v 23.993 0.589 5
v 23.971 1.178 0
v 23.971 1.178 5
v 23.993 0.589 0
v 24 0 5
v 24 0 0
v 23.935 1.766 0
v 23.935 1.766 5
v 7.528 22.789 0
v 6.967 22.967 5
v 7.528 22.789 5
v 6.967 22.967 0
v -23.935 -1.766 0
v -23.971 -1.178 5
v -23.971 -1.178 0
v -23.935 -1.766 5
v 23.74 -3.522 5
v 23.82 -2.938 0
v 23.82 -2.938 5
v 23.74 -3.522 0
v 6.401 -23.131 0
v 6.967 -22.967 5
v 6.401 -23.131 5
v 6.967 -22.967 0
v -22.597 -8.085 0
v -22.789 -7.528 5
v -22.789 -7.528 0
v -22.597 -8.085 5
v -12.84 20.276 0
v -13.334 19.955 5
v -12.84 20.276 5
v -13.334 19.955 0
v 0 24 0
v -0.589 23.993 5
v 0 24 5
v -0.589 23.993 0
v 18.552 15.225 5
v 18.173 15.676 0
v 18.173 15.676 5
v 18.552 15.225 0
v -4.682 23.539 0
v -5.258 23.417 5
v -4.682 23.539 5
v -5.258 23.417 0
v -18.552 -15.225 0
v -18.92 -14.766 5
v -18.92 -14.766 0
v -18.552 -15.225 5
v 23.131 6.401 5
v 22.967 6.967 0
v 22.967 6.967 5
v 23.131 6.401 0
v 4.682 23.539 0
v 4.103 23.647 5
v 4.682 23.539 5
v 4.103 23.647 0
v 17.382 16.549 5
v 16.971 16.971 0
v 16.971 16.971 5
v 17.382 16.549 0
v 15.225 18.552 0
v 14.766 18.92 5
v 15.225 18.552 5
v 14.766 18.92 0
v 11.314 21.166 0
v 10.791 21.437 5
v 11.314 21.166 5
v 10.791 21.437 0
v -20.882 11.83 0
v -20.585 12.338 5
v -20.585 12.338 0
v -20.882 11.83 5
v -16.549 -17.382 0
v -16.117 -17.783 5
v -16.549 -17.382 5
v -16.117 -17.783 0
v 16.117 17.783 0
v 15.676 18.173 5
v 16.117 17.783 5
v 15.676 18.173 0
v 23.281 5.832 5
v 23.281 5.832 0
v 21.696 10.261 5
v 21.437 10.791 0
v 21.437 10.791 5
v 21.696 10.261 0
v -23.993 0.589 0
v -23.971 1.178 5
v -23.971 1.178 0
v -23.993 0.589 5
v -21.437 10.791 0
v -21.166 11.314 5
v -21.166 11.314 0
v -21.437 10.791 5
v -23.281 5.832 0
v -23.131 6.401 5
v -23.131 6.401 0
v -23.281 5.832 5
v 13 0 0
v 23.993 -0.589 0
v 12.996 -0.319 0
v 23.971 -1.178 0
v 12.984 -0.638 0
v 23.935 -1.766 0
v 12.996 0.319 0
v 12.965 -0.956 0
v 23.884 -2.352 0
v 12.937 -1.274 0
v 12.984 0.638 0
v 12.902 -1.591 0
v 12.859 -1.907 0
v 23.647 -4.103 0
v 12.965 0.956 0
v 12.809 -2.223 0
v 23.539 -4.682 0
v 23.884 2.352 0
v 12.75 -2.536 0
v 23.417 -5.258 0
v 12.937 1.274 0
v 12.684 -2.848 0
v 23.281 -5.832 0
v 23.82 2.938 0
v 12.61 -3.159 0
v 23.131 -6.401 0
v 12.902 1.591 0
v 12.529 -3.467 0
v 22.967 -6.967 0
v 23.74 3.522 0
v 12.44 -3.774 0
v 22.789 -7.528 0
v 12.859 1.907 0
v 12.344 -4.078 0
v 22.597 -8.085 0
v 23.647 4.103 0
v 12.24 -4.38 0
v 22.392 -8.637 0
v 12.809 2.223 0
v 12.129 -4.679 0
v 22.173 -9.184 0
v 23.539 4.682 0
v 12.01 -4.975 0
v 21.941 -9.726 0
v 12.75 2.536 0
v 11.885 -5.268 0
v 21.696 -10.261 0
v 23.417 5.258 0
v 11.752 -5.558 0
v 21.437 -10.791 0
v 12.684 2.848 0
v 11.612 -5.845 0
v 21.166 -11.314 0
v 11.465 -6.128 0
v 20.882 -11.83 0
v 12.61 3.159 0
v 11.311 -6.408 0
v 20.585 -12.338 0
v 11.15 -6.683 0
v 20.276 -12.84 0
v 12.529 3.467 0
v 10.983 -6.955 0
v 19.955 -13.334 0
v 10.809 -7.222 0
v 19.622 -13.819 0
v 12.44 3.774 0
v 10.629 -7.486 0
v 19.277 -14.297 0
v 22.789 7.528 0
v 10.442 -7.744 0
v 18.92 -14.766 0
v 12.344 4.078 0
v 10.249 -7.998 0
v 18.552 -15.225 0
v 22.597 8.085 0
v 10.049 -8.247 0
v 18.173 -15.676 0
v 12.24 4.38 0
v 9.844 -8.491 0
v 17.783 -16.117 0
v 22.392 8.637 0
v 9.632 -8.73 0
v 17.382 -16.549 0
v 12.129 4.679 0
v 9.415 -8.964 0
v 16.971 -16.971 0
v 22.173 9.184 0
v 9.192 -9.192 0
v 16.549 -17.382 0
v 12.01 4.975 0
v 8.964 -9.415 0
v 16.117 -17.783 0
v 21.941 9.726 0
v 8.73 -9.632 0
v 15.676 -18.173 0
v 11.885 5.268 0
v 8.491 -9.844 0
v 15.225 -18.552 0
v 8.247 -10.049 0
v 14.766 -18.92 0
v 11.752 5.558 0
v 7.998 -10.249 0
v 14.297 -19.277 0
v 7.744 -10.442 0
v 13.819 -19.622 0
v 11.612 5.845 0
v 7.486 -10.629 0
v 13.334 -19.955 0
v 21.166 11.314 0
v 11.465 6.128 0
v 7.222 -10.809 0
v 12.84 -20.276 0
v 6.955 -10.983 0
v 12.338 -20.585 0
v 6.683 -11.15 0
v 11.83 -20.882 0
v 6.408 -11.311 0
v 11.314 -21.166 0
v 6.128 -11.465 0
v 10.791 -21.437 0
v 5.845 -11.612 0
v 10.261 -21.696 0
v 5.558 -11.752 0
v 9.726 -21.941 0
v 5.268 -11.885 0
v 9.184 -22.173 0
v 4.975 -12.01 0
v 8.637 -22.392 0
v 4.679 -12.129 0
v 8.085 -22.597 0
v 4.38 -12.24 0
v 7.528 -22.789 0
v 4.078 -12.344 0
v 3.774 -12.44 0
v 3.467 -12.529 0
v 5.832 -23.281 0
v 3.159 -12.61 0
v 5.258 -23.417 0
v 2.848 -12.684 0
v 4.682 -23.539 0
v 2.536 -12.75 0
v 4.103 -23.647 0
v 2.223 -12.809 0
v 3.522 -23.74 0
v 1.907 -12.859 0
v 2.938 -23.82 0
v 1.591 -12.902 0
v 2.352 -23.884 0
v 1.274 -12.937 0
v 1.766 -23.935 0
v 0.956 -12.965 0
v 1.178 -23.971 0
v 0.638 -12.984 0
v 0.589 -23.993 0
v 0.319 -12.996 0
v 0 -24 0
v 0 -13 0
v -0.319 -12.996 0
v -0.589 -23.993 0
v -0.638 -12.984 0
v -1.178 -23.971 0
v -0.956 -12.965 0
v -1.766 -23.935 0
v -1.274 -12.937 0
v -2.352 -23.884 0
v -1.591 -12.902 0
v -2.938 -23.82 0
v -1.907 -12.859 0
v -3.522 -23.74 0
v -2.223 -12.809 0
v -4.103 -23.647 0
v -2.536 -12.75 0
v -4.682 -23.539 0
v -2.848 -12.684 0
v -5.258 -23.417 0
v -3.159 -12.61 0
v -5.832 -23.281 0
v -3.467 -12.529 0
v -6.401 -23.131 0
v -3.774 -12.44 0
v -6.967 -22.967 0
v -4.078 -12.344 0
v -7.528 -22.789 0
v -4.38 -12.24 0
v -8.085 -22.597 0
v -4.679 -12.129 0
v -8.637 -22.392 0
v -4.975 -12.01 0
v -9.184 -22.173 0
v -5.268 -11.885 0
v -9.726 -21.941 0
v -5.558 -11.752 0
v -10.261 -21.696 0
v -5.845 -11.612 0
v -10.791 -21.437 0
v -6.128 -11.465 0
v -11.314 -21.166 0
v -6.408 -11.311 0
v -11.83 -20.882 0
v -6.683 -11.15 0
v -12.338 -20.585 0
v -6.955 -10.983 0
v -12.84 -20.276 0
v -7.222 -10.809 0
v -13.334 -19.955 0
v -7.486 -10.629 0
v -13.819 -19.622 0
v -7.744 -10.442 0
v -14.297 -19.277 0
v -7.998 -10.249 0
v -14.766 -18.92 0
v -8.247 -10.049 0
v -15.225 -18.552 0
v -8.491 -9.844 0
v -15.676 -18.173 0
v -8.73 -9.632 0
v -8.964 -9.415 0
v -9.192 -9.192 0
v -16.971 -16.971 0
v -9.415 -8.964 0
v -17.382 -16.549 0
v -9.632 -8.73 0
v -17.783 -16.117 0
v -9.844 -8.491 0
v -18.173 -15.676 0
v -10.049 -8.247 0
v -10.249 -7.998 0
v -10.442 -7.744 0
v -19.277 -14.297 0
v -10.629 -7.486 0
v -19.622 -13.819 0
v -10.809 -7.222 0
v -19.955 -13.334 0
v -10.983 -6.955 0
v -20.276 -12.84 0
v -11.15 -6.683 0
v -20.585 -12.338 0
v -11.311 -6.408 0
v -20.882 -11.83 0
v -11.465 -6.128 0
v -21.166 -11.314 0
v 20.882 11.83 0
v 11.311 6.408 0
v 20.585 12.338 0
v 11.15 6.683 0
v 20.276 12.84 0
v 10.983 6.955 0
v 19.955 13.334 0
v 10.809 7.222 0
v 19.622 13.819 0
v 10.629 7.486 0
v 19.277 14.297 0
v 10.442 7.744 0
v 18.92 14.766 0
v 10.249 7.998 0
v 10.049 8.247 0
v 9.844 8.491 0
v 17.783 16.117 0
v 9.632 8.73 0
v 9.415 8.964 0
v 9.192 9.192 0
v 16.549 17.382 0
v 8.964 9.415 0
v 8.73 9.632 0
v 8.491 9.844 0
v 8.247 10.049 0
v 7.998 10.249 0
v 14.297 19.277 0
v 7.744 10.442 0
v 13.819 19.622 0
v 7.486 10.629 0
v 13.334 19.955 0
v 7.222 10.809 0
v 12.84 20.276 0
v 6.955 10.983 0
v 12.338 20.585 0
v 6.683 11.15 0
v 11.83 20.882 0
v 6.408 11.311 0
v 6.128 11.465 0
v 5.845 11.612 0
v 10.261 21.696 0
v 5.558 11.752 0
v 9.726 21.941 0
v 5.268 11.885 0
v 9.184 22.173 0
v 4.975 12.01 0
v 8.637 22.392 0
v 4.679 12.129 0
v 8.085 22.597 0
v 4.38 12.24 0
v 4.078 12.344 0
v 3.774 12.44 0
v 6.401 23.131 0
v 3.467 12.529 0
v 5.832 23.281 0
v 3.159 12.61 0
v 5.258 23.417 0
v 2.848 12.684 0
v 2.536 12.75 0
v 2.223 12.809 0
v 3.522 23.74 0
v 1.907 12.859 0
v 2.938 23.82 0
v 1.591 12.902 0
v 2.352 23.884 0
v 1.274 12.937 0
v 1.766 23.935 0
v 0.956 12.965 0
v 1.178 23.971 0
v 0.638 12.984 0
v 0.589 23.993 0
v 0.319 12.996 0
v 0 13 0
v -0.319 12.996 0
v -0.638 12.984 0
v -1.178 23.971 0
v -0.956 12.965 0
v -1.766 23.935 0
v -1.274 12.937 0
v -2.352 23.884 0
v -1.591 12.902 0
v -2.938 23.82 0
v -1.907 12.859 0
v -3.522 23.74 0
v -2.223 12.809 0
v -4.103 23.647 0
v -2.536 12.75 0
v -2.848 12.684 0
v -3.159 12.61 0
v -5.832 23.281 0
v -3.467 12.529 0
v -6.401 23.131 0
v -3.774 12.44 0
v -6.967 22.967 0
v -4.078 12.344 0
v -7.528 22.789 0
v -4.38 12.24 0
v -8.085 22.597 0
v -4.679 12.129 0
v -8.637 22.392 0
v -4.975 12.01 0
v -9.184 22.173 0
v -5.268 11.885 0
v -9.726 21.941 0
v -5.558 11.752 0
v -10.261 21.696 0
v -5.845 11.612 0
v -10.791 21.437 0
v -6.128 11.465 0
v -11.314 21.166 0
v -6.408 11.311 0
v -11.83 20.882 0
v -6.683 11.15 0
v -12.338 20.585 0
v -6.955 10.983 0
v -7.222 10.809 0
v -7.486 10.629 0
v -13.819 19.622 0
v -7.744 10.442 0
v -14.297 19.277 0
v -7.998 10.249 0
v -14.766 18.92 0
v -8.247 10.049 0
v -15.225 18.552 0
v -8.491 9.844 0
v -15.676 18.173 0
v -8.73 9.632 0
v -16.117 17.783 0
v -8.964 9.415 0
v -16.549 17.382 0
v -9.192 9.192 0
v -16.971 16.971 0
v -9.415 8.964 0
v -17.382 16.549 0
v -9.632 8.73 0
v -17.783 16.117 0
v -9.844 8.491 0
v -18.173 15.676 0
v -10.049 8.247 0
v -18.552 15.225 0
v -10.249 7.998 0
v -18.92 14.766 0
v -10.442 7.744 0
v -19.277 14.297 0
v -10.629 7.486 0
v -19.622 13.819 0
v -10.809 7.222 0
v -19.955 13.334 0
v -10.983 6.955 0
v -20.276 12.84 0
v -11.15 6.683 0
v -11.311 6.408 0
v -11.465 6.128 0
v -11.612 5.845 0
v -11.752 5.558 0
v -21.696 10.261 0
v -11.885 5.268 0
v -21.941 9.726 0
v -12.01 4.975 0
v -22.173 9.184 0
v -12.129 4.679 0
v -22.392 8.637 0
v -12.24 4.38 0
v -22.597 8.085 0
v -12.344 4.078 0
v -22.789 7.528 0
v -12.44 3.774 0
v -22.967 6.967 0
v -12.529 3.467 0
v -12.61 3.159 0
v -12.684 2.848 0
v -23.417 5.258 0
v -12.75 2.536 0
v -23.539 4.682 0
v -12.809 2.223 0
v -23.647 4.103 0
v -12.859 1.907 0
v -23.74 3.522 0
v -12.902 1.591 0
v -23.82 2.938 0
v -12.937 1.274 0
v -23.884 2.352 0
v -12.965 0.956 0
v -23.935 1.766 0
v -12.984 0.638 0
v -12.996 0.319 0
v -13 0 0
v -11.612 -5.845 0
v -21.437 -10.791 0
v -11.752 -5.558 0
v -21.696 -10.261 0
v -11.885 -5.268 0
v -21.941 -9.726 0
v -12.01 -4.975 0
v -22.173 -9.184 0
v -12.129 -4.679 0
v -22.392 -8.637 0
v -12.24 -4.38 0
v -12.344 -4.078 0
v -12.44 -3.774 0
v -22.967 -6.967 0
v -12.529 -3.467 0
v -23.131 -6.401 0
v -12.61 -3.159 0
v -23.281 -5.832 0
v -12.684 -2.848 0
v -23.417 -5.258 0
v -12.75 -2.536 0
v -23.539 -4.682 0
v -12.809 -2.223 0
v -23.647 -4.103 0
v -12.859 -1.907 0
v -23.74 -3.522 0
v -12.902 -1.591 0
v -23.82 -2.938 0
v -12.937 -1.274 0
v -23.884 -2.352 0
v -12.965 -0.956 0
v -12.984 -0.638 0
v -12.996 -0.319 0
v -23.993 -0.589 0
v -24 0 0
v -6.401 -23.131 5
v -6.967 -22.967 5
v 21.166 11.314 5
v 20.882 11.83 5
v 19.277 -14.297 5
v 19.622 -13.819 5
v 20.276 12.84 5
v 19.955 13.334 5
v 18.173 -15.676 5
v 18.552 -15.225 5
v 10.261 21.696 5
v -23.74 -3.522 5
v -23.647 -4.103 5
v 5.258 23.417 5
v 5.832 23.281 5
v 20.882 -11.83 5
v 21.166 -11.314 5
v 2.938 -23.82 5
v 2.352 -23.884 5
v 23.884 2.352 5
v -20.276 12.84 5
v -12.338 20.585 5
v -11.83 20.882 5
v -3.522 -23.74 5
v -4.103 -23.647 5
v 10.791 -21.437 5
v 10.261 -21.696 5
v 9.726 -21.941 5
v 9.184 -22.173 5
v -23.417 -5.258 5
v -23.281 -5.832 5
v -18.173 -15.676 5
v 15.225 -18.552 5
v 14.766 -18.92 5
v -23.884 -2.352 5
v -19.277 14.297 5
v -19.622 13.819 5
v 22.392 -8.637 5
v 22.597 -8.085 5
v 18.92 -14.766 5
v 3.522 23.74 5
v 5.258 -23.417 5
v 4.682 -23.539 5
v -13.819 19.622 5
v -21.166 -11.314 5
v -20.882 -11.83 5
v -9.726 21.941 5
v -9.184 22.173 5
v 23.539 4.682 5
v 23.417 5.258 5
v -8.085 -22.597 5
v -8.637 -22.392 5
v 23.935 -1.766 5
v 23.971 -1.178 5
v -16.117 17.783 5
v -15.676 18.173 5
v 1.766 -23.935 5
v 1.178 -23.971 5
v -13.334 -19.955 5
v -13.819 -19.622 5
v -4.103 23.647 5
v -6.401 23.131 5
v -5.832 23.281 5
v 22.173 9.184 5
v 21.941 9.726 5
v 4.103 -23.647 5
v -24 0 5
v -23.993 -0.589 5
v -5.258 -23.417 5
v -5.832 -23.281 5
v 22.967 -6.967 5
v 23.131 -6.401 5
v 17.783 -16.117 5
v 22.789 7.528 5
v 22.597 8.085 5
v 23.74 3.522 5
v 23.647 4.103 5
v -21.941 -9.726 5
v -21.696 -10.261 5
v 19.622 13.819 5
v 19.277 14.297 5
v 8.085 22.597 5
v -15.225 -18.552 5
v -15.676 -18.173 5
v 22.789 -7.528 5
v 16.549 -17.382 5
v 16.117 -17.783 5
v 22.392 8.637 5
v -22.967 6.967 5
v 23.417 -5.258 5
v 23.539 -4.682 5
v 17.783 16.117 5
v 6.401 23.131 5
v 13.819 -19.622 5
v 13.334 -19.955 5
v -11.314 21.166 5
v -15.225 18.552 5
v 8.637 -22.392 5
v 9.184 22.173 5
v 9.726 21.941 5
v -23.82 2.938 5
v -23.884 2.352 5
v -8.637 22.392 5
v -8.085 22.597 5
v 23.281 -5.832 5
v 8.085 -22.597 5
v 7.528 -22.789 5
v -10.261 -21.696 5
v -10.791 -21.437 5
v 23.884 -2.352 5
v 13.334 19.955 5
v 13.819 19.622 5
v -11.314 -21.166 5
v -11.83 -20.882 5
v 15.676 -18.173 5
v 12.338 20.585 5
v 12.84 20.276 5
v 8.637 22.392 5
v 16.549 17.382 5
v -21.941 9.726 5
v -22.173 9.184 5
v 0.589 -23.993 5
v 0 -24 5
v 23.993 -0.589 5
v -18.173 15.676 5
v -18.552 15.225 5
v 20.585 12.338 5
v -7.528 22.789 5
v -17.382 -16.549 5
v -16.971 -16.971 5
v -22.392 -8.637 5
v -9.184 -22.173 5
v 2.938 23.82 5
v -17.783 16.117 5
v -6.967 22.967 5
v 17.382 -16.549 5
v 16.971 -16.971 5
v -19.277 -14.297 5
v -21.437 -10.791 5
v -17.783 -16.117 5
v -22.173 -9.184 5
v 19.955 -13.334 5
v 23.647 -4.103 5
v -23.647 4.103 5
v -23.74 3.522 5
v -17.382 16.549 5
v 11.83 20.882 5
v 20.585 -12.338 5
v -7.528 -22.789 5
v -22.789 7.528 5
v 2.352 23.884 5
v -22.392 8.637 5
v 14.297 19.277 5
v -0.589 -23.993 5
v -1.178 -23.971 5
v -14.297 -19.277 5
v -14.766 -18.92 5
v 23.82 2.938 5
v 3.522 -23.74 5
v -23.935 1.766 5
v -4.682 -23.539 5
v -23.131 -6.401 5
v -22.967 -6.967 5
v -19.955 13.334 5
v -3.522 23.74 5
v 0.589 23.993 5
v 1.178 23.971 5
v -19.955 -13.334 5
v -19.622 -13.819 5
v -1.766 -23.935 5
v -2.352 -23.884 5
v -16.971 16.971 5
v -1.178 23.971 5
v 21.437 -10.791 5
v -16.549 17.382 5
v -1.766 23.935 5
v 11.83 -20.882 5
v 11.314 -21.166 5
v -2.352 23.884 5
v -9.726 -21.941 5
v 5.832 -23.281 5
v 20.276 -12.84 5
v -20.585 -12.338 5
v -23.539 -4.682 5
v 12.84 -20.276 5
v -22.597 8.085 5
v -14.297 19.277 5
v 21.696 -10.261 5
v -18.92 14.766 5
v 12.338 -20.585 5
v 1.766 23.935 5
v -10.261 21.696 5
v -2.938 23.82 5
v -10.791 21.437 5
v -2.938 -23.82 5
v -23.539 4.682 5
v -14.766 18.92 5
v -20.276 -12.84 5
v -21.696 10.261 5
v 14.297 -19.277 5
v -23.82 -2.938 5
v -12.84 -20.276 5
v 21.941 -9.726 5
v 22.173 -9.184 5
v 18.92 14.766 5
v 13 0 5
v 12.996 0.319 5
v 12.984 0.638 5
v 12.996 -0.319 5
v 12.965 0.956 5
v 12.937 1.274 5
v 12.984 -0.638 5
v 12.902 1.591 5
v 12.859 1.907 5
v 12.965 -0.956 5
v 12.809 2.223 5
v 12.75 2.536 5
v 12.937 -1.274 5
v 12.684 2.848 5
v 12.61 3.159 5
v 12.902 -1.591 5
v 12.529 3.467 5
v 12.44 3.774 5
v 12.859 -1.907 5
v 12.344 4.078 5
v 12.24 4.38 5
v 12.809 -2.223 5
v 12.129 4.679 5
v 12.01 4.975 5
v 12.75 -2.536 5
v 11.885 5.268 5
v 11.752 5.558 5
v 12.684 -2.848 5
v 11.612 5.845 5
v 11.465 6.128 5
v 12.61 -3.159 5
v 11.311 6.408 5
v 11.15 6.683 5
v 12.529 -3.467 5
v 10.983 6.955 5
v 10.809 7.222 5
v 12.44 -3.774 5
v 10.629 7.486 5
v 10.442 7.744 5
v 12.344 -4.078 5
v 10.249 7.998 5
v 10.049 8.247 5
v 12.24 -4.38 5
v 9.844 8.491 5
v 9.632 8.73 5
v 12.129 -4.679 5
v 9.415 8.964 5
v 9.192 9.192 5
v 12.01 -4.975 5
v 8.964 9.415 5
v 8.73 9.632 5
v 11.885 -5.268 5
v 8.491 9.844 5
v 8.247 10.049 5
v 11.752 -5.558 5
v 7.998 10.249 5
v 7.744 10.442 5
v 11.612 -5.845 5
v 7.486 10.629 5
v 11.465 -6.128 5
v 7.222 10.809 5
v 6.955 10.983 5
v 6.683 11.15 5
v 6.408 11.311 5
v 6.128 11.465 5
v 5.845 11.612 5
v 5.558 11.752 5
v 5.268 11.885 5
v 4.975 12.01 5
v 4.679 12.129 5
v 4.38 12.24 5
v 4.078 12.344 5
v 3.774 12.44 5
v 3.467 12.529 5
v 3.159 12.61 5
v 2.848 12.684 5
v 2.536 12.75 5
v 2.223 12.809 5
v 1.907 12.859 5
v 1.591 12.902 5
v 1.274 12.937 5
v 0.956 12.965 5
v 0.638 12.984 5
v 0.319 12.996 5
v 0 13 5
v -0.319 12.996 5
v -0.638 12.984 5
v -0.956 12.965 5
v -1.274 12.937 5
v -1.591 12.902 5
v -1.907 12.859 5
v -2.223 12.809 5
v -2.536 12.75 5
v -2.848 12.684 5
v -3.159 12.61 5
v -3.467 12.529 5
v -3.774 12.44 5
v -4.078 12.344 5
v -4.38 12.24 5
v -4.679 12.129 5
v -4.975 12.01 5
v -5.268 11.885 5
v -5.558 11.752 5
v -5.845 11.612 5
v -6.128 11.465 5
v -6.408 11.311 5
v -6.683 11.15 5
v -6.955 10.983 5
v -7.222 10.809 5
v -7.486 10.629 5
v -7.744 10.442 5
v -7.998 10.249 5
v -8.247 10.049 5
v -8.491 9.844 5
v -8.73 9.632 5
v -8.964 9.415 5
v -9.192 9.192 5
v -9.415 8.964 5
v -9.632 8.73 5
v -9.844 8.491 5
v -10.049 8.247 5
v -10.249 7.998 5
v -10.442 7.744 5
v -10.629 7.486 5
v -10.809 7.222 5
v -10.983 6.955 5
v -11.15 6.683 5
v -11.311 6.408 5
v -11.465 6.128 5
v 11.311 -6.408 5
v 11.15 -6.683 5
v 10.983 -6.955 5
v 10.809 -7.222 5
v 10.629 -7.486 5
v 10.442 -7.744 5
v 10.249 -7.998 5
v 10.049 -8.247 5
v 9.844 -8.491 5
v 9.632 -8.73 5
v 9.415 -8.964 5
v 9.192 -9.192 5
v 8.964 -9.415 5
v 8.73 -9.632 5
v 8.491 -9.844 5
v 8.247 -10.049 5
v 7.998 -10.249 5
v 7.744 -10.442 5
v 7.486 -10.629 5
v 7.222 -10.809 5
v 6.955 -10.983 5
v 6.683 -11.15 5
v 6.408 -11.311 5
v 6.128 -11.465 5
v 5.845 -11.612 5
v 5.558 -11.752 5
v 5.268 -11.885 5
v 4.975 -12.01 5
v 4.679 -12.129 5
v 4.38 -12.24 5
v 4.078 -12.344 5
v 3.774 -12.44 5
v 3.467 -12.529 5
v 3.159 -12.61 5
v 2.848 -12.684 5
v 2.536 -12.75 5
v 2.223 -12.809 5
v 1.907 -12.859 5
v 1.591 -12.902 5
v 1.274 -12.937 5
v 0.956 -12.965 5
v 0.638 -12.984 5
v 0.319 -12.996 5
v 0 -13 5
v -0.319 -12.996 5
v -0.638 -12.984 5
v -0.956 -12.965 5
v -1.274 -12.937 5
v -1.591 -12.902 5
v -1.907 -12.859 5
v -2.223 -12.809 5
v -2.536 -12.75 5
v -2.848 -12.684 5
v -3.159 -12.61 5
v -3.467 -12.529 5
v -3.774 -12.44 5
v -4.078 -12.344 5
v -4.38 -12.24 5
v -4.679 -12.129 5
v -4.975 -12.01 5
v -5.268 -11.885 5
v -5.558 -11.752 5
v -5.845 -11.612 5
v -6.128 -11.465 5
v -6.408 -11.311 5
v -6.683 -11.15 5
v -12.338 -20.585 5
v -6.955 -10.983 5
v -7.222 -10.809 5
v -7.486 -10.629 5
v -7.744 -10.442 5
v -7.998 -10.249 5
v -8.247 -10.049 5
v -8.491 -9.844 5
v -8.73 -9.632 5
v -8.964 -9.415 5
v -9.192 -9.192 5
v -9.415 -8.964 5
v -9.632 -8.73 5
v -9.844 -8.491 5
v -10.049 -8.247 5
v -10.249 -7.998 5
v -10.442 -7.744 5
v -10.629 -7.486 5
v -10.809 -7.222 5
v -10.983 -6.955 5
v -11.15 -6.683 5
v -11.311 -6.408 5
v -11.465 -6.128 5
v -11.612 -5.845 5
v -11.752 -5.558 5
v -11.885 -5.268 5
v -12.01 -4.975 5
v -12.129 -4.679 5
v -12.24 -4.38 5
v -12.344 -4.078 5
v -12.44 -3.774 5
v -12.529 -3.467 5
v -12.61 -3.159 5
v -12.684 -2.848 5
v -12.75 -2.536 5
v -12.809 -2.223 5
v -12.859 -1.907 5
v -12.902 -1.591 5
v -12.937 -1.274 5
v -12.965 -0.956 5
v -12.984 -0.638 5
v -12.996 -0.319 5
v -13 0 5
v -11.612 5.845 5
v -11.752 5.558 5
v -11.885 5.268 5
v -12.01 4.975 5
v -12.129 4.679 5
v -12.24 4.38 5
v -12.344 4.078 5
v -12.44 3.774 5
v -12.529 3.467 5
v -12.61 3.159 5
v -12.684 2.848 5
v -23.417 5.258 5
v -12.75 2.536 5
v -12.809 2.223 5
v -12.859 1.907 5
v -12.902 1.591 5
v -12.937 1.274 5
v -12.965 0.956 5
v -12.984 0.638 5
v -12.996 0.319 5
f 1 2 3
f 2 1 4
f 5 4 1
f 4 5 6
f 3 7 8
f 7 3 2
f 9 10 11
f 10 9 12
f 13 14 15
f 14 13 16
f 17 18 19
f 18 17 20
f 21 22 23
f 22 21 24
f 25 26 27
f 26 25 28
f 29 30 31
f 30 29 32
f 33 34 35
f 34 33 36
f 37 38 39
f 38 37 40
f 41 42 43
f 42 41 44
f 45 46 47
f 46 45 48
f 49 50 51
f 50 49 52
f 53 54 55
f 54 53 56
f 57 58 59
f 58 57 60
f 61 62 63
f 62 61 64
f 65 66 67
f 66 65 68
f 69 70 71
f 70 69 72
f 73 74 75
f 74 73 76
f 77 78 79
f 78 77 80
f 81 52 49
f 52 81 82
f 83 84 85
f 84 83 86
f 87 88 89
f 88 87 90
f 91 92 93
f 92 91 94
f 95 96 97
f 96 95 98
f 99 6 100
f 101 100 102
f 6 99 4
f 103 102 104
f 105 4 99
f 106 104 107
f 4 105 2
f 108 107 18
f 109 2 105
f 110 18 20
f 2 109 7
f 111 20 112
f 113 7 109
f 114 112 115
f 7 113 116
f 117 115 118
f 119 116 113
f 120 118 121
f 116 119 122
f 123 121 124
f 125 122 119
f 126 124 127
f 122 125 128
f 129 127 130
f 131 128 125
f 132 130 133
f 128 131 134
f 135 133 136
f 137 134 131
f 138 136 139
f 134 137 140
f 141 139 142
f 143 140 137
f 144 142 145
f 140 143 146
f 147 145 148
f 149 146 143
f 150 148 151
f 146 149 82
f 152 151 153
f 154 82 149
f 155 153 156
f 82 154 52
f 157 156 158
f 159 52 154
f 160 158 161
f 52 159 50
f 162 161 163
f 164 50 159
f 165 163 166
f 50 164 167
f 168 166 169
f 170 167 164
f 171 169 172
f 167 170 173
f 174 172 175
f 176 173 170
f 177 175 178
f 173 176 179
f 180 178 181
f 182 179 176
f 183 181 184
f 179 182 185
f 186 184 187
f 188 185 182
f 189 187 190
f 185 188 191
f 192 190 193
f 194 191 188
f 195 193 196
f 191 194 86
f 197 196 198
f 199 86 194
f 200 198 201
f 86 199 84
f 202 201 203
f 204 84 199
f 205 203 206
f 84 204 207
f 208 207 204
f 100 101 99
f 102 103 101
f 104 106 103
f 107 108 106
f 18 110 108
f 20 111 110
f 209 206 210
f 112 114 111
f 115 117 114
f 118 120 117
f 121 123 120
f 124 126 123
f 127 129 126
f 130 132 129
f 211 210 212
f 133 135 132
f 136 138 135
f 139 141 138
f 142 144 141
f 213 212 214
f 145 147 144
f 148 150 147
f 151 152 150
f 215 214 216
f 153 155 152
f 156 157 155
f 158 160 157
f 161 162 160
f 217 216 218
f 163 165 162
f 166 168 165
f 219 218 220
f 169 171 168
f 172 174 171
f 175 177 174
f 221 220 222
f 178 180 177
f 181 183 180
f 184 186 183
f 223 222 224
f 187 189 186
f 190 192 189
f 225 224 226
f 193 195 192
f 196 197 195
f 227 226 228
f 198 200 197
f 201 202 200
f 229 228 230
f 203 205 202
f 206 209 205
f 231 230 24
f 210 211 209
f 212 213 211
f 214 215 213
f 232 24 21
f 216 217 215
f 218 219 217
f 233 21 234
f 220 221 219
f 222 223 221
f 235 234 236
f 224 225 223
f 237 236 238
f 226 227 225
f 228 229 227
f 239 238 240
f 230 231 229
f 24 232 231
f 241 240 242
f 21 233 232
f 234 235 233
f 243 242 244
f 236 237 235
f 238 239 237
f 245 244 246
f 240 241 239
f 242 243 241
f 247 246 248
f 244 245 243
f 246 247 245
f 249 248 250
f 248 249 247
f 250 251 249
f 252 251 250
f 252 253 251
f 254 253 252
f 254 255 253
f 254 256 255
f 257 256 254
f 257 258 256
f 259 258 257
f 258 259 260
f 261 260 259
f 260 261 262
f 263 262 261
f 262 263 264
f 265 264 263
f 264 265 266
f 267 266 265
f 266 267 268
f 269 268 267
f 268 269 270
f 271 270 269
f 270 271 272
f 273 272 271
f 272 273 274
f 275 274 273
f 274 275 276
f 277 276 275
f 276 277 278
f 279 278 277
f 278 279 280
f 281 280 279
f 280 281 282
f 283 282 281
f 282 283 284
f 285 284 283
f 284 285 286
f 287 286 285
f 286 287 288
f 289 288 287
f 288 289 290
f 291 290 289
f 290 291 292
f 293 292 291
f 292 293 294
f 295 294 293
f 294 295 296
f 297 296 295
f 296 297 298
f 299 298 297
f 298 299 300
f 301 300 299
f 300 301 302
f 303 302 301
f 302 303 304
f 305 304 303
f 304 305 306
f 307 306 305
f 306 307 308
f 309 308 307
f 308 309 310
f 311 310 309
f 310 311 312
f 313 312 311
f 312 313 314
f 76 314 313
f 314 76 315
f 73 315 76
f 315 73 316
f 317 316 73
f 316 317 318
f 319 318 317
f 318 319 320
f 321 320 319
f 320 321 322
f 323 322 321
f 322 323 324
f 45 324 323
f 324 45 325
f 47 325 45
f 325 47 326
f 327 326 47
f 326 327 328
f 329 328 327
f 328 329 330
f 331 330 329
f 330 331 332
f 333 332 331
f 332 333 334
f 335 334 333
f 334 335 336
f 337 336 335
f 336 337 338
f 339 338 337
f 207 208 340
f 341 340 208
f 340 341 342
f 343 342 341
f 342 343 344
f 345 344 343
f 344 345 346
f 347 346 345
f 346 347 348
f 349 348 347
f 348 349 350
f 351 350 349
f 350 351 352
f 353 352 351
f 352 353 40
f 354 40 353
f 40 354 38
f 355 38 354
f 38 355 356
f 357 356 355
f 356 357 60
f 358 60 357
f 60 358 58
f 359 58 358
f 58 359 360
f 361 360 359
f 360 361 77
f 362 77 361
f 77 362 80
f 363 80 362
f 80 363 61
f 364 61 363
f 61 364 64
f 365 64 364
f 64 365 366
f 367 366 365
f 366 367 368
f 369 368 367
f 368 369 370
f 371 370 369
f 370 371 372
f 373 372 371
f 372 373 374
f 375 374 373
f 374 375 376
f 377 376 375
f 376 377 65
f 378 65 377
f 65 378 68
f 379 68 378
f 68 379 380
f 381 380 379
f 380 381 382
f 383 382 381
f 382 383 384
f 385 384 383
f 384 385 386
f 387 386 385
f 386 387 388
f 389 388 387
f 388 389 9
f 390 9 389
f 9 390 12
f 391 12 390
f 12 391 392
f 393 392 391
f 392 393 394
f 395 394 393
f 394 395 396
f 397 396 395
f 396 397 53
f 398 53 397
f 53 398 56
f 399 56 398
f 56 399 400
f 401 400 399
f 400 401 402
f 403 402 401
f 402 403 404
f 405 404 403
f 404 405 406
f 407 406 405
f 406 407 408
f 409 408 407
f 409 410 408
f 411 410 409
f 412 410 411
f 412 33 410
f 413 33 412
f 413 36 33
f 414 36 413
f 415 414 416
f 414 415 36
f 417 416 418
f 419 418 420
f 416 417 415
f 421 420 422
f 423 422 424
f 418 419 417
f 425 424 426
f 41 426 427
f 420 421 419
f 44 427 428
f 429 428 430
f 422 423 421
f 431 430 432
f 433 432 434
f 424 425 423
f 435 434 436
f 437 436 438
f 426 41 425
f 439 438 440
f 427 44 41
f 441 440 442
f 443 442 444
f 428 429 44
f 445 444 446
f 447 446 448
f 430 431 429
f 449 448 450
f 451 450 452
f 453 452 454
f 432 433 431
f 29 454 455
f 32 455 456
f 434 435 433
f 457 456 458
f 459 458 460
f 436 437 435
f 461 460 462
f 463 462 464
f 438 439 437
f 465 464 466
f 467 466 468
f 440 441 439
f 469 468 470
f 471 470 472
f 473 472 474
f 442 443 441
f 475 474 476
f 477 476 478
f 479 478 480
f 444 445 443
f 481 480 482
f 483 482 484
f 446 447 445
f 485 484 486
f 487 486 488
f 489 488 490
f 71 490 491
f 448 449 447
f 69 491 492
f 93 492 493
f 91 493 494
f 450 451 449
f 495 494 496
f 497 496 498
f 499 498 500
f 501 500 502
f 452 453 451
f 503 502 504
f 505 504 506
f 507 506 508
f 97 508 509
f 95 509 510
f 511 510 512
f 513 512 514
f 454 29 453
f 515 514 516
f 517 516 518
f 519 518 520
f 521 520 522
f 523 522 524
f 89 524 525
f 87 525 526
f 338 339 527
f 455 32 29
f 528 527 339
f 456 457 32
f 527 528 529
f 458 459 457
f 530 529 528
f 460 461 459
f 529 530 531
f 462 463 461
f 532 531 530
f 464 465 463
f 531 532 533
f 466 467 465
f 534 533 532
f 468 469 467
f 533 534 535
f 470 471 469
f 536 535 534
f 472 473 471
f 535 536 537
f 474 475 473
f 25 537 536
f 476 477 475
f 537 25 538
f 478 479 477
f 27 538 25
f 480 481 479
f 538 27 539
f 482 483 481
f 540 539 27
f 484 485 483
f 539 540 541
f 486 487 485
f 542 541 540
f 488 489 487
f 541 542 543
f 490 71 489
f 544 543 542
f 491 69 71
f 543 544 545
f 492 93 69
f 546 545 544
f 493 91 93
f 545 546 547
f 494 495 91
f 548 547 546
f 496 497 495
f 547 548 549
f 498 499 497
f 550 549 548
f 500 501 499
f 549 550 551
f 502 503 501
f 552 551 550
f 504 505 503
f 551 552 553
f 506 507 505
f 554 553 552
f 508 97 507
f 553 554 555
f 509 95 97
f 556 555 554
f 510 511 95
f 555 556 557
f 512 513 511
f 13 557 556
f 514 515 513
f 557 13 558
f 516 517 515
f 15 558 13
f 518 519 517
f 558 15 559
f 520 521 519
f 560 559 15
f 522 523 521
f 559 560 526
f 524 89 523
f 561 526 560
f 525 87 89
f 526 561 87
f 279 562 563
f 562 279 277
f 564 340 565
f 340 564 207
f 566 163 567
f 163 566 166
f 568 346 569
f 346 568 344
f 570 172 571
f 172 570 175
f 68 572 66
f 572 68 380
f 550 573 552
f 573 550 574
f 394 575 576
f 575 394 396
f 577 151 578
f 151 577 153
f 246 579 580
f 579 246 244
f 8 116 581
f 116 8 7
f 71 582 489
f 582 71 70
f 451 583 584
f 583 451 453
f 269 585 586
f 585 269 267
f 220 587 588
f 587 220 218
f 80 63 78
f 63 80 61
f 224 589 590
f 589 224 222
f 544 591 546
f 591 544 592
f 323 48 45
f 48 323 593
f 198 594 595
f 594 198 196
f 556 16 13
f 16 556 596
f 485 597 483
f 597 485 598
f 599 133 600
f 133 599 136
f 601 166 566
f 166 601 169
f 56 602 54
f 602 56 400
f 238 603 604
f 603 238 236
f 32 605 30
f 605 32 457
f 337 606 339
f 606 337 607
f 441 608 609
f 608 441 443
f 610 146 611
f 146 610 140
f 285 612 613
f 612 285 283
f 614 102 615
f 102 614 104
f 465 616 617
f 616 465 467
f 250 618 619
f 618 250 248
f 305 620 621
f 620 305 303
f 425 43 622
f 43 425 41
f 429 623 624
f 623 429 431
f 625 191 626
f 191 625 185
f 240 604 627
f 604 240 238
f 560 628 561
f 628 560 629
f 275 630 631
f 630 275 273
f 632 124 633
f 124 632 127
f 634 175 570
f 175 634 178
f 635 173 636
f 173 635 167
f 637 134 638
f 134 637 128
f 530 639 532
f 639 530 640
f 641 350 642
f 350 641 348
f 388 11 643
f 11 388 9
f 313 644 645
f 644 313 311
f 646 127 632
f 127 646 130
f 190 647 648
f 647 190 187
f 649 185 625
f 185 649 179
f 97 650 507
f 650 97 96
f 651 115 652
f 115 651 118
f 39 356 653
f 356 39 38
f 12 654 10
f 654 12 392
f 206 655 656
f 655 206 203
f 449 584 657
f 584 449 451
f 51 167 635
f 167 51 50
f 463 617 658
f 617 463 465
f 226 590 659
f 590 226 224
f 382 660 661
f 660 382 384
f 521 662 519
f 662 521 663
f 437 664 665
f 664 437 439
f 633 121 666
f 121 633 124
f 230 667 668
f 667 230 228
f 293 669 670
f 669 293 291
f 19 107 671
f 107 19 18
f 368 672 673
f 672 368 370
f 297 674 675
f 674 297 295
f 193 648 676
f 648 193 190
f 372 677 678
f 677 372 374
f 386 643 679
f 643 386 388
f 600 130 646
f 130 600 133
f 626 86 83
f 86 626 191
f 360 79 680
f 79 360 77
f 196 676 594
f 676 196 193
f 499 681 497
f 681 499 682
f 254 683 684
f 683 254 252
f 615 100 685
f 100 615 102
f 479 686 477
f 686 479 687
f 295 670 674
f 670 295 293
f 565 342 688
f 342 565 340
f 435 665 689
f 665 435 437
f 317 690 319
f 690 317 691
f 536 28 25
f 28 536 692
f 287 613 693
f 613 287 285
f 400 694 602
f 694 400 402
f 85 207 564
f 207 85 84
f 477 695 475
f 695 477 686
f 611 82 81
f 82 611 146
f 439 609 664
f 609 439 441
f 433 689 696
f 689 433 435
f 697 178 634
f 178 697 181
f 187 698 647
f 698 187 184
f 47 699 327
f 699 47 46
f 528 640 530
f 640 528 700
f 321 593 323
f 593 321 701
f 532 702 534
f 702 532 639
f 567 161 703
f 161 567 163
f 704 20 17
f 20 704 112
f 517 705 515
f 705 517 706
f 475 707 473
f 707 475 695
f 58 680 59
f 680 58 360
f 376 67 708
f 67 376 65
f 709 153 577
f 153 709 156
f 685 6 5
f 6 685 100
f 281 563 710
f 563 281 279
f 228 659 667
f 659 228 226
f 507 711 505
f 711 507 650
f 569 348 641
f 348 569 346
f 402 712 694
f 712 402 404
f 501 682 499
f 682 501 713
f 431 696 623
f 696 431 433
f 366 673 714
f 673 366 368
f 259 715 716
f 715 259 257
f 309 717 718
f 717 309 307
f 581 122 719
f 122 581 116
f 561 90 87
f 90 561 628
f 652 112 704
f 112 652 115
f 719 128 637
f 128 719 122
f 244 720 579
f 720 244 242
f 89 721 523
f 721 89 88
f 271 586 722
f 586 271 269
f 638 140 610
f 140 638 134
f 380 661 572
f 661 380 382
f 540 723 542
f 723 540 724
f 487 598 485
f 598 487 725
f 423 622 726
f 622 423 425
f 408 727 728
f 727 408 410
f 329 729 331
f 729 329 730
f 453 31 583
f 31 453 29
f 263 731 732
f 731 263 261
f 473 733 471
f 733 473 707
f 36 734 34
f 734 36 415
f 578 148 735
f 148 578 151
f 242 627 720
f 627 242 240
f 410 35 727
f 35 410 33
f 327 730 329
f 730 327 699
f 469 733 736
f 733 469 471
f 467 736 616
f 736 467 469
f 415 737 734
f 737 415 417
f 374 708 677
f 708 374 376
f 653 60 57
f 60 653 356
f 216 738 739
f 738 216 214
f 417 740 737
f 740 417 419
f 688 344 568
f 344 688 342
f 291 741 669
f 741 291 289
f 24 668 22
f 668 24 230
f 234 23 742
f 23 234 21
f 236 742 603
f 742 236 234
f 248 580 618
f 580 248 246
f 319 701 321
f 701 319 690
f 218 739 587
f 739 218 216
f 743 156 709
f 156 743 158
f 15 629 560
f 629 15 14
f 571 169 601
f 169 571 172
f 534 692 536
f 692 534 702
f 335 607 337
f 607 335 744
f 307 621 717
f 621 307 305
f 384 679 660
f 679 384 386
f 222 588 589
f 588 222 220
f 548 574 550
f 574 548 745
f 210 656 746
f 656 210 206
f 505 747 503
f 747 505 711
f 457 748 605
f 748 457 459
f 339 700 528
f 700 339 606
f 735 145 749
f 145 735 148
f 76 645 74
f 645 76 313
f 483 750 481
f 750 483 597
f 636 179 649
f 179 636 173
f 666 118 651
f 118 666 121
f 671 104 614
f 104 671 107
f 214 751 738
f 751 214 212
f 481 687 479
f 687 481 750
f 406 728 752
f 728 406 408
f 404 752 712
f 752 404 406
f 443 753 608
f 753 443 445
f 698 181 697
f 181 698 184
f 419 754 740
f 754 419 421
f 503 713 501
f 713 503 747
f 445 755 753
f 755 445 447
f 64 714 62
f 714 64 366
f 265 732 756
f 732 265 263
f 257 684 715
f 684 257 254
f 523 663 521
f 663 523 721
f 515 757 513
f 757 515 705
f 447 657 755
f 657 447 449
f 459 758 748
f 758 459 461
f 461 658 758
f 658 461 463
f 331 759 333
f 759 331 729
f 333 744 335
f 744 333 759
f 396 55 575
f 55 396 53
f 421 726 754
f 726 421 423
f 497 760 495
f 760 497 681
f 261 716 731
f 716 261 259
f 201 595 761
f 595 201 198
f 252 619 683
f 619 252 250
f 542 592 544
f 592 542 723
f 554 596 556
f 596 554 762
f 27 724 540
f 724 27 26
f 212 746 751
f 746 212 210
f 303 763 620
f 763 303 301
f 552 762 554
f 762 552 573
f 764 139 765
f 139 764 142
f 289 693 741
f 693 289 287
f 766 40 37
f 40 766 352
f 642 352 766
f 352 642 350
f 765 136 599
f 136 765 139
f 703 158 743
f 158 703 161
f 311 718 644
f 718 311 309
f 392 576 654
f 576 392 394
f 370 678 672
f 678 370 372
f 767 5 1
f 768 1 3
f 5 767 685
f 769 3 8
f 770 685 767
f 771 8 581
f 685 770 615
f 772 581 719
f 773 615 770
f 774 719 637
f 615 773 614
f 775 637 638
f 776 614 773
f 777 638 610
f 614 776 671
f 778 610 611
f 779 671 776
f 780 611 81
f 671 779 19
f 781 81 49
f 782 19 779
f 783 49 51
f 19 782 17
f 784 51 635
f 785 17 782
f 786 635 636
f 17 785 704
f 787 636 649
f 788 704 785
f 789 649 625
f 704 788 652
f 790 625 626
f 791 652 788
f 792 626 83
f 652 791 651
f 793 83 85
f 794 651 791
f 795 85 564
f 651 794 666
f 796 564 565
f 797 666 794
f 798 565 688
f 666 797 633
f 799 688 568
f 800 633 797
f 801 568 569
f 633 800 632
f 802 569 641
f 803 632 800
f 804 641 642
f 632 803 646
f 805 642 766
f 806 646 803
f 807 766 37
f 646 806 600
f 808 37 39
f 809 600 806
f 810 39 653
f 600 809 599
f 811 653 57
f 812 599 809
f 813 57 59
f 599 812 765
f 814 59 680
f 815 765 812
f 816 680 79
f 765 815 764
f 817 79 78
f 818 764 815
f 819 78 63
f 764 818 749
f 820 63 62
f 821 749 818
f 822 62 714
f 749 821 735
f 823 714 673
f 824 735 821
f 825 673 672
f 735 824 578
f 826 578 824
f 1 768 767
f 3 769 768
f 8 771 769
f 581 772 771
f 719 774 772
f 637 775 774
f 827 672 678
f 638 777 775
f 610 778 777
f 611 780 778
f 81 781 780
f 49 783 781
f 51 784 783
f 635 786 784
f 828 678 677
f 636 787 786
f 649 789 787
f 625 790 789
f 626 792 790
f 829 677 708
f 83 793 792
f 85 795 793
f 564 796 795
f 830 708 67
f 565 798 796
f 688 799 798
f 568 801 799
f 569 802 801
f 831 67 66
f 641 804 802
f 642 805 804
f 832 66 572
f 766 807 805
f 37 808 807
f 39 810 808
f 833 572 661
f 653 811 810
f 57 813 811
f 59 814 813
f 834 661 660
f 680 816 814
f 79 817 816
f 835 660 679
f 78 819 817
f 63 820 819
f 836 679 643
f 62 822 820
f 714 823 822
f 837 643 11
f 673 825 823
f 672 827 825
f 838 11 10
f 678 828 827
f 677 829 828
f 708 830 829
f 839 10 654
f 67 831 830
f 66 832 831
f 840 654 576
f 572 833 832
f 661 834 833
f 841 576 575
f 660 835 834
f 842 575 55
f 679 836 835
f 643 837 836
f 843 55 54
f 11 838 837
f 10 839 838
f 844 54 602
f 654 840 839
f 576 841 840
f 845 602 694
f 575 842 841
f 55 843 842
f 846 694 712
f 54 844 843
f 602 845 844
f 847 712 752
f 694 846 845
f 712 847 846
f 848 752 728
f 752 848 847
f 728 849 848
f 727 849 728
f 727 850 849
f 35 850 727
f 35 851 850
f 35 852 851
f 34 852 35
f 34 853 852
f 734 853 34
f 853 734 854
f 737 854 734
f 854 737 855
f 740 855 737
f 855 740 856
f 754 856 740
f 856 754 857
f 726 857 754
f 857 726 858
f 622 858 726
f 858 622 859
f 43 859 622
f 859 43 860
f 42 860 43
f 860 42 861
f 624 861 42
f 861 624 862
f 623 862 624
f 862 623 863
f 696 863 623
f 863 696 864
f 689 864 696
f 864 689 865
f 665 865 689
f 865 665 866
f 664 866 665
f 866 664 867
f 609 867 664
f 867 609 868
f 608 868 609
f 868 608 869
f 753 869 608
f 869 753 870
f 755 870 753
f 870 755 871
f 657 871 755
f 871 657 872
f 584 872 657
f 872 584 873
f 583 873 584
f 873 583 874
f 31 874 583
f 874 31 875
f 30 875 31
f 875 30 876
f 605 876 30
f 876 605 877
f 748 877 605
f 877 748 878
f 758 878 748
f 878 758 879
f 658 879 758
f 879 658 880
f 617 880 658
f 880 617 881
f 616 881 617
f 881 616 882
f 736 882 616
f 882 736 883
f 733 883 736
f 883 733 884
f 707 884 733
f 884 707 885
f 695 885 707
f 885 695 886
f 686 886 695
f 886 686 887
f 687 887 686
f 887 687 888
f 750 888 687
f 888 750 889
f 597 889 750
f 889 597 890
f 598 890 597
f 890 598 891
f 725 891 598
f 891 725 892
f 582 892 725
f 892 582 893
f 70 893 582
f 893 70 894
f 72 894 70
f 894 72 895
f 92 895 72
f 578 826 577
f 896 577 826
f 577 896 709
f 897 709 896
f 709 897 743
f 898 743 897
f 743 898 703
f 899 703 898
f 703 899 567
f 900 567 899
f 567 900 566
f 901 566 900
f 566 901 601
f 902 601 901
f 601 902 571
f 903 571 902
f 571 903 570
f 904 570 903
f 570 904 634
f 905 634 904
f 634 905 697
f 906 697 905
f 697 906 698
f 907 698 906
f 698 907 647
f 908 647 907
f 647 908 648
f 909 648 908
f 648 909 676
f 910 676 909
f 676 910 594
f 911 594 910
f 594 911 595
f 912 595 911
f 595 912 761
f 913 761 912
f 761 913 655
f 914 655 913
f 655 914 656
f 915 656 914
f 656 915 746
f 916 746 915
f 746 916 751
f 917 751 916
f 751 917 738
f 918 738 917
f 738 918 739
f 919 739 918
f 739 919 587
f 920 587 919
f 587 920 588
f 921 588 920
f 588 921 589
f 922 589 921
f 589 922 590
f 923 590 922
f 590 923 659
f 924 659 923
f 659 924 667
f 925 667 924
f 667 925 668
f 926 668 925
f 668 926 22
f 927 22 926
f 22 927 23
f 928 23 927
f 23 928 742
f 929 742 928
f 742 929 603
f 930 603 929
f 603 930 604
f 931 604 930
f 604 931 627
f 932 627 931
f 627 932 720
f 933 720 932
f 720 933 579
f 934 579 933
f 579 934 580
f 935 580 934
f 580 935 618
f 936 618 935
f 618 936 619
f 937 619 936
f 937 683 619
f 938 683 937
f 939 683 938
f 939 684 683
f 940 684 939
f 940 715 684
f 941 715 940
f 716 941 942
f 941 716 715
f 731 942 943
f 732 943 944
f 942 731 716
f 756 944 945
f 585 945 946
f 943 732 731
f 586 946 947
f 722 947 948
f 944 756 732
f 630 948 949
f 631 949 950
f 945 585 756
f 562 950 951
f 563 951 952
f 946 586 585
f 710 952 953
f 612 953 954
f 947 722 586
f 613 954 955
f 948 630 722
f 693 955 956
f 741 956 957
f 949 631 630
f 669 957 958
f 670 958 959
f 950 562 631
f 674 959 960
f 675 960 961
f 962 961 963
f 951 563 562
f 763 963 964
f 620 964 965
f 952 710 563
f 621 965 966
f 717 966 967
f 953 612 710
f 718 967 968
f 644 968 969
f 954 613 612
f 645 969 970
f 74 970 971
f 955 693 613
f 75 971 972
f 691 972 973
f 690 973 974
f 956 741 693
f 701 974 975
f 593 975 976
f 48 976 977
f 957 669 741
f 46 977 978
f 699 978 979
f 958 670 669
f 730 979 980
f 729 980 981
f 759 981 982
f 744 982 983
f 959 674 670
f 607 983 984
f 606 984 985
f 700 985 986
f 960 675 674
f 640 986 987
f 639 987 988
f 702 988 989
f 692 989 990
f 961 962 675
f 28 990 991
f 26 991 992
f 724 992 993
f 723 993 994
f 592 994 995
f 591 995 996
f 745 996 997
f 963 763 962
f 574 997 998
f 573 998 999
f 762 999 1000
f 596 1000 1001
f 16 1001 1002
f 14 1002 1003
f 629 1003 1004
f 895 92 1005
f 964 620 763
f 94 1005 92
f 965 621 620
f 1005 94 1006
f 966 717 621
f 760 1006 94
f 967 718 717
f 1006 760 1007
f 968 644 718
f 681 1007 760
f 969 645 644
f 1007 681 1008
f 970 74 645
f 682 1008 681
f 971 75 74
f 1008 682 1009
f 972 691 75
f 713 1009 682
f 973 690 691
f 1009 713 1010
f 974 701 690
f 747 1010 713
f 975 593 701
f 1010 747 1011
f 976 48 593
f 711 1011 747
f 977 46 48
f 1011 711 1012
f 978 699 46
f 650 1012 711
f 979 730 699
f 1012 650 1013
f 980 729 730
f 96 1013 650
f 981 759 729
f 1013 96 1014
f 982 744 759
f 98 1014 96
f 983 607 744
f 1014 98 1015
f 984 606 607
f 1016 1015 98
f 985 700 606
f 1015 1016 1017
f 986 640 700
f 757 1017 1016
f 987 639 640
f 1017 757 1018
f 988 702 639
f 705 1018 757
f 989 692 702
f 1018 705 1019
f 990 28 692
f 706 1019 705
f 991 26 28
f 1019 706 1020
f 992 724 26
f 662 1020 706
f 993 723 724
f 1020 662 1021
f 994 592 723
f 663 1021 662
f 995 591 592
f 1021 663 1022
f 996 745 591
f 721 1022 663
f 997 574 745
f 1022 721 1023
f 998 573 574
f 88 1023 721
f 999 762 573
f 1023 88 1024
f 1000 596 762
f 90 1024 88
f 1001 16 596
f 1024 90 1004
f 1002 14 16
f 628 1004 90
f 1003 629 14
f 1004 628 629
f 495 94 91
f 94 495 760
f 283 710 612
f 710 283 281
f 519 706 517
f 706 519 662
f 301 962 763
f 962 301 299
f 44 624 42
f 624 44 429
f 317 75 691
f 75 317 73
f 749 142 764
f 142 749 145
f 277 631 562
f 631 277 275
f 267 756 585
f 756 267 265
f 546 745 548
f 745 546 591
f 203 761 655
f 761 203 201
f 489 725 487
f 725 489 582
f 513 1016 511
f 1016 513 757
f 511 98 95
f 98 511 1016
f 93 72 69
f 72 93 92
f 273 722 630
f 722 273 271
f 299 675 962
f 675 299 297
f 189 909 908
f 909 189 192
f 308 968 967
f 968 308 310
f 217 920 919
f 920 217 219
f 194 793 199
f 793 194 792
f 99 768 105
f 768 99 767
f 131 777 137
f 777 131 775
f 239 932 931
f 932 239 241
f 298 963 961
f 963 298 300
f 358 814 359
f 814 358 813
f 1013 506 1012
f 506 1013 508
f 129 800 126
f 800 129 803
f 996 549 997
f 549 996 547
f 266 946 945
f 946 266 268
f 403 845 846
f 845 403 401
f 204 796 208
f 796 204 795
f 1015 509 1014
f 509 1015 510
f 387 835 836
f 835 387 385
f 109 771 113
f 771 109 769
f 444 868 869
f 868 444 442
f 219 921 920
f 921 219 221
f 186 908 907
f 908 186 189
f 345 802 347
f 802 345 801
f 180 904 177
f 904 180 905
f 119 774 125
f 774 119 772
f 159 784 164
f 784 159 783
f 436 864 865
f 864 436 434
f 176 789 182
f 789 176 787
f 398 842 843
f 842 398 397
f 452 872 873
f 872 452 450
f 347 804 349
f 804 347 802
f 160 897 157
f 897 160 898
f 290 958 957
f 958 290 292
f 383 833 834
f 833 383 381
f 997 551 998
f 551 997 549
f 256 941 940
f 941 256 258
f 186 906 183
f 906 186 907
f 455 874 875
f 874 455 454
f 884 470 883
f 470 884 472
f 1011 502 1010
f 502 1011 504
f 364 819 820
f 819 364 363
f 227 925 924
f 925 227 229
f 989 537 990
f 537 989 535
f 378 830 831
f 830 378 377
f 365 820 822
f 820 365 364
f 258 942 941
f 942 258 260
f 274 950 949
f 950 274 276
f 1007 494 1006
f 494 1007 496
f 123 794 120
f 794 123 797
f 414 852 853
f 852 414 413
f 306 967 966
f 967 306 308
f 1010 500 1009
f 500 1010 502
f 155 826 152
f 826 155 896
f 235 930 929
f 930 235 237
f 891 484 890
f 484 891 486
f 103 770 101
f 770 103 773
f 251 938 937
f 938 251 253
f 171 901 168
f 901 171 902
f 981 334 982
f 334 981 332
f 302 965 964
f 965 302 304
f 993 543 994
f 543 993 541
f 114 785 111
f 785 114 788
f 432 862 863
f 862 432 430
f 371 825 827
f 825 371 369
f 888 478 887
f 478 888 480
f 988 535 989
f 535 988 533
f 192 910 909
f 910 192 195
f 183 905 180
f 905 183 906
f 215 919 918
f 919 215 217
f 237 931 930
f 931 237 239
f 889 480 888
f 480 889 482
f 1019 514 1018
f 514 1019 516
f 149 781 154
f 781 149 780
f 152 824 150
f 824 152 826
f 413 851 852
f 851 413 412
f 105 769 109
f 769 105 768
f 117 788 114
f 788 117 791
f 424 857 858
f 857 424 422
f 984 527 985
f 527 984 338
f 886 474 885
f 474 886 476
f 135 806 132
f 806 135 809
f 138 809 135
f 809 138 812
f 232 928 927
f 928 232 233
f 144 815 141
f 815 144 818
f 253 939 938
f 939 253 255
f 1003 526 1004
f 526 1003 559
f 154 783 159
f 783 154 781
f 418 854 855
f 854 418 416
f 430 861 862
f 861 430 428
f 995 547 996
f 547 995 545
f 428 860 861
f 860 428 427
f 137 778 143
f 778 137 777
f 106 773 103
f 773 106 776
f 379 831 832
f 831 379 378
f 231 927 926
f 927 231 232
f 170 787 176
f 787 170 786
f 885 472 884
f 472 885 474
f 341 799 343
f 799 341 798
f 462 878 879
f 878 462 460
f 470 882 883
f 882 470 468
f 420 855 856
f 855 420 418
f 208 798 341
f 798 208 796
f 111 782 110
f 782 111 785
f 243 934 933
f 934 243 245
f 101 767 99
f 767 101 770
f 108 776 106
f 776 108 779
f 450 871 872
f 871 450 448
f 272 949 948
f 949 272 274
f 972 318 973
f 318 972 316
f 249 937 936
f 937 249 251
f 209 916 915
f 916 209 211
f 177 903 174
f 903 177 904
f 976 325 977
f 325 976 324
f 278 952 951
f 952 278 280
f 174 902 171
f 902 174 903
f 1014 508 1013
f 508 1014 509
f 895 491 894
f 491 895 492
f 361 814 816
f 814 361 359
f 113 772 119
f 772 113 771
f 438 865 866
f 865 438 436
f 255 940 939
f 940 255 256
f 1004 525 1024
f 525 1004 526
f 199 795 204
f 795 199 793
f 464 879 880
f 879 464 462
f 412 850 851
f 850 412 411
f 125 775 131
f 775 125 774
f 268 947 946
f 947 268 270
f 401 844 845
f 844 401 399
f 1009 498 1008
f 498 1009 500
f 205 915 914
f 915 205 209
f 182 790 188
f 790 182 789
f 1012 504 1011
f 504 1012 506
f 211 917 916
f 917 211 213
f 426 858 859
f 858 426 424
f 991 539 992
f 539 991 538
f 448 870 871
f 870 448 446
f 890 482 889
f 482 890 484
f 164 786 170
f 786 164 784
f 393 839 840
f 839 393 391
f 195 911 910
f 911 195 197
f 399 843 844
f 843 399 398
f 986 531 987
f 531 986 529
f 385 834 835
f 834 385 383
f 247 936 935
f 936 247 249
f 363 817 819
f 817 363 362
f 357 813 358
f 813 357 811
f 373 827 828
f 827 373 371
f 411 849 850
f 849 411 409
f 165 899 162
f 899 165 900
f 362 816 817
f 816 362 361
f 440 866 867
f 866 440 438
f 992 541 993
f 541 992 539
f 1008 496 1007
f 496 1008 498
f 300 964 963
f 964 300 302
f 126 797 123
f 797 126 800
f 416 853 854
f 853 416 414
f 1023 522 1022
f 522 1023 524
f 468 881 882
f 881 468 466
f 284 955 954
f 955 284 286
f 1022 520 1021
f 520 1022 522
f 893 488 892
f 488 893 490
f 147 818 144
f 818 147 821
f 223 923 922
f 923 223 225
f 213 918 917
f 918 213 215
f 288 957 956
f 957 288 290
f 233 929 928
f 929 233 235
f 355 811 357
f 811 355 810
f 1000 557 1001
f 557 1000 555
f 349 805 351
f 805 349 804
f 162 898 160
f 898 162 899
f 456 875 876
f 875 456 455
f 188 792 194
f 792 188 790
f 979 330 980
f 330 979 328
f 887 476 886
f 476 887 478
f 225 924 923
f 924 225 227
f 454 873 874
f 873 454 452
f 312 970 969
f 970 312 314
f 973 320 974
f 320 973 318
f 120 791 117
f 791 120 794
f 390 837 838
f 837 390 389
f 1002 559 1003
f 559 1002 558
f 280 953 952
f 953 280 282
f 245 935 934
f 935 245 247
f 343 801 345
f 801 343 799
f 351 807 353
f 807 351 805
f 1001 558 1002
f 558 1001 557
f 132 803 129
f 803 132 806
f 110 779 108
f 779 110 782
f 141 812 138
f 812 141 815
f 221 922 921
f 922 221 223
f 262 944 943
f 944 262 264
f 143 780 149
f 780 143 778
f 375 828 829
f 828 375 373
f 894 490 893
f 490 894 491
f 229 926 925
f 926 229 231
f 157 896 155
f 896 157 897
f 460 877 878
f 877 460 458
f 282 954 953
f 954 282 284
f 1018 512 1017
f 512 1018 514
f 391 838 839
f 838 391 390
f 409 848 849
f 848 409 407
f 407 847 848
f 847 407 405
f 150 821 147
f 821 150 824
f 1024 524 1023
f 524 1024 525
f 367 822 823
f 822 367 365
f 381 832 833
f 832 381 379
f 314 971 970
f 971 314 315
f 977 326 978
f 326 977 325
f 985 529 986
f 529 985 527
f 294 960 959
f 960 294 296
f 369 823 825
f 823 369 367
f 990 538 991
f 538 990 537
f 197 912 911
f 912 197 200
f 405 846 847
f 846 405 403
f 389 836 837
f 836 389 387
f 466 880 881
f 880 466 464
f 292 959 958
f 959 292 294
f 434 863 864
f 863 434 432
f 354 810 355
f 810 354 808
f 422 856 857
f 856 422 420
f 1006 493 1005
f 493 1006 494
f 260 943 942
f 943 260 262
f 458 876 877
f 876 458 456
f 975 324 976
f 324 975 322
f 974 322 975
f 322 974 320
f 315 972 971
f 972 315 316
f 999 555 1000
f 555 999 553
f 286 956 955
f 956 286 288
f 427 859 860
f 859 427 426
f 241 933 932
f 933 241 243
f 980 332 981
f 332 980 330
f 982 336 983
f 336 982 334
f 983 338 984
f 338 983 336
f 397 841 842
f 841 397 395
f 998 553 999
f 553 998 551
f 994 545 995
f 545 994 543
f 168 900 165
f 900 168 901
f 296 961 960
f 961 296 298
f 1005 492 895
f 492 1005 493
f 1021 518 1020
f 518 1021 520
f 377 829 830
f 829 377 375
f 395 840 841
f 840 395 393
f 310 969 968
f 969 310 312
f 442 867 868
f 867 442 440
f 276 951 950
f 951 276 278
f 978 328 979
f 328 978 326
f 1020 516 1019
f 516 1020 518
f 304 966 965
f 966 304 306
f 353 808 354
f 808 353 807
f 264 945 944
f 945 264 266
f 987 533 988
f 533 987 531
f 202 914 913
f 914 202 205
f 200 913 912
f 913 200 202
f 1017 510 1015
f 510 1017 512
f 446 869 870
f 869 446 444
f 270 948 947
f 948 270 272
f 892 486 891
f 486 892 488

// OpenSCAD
$fn = 256;
epsilon = 0.001;
outer_diameter = 48;
inner_diameter = 26;
height = 5;

difference() {
    cylinder(d=outer_diameter, h=height);
    translate([0, 0, -epsilon]) cylinder(d=inner_diameter, h=height + 2 * epsilon);
}
